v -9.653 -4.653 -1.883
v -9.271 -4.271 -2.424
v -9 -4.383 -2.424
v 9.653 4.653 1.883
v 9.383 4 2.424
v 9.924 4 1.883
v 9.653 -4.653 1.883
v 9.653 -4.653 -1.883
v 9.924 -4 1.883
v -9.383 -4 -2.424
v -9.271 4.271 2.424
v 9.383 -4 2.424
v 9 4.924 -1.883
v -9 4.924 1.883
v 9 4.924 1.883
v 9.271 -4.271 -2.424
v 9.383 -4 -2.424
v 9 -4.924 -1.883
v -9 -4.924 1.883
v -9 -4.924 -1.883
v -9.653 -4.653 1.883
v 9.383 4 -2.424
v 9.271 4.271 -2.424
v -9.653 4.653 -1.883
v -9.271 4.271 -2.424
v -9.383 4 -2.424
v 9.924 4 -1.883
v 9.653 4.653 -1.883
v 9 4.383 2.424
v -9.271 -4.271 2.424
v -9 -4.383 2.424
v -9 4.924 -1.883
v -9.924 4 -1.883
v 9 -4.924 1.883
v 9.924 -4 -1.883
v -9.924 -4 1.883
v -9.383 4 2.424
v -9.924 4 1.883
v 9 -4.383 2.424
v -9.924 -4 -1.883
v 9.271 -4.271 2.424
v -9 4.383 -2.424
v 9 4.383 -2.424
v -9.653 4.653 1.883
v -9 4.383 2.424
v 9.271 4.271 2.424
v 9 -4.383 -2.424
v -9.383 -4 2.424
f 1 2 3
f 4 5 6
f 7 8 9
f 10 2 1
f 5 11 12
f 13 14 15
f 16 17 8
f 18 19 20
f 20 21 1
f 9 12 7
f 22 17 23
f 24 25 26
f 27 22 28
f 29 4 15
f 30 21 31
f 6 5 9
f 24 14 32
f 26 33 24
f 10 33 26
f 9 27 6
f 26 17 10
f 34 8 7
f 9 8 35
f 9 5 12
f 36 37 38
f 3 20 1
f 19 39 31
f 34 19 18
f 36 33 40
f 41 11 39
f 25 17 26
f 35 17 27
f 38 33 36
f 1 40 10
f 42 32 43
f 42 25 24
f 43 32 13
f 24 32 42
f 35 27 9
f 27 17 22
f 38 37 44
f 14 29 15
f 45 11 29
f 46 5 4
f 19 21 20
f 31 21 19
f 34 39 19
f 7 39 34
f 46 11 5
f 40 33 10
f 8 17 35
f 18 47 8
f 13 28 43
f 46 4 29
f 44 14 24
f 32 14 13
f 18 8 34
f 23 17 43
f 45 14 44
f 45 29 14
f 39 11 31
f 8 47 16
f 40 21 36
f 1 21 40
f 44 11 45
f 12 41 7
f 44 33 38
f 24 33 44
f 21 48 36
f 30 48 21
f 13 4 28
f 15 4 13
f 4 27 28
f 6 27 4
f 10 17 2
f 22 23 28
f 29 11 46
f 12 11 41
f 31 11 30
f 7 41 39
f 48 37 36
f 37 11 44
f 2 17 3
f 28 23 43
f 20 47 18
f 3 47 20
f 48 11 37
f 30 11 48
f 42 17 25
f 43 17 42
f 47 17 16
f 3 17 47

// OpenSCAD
// Generated by scadwright. Do not hand-edit —
// edit the Python source and regenerate.

$fn = 8;

// RoundedBox
minkowski() {
    cube([18, 8, 3], center=true);
    sphere(r=1);
}
